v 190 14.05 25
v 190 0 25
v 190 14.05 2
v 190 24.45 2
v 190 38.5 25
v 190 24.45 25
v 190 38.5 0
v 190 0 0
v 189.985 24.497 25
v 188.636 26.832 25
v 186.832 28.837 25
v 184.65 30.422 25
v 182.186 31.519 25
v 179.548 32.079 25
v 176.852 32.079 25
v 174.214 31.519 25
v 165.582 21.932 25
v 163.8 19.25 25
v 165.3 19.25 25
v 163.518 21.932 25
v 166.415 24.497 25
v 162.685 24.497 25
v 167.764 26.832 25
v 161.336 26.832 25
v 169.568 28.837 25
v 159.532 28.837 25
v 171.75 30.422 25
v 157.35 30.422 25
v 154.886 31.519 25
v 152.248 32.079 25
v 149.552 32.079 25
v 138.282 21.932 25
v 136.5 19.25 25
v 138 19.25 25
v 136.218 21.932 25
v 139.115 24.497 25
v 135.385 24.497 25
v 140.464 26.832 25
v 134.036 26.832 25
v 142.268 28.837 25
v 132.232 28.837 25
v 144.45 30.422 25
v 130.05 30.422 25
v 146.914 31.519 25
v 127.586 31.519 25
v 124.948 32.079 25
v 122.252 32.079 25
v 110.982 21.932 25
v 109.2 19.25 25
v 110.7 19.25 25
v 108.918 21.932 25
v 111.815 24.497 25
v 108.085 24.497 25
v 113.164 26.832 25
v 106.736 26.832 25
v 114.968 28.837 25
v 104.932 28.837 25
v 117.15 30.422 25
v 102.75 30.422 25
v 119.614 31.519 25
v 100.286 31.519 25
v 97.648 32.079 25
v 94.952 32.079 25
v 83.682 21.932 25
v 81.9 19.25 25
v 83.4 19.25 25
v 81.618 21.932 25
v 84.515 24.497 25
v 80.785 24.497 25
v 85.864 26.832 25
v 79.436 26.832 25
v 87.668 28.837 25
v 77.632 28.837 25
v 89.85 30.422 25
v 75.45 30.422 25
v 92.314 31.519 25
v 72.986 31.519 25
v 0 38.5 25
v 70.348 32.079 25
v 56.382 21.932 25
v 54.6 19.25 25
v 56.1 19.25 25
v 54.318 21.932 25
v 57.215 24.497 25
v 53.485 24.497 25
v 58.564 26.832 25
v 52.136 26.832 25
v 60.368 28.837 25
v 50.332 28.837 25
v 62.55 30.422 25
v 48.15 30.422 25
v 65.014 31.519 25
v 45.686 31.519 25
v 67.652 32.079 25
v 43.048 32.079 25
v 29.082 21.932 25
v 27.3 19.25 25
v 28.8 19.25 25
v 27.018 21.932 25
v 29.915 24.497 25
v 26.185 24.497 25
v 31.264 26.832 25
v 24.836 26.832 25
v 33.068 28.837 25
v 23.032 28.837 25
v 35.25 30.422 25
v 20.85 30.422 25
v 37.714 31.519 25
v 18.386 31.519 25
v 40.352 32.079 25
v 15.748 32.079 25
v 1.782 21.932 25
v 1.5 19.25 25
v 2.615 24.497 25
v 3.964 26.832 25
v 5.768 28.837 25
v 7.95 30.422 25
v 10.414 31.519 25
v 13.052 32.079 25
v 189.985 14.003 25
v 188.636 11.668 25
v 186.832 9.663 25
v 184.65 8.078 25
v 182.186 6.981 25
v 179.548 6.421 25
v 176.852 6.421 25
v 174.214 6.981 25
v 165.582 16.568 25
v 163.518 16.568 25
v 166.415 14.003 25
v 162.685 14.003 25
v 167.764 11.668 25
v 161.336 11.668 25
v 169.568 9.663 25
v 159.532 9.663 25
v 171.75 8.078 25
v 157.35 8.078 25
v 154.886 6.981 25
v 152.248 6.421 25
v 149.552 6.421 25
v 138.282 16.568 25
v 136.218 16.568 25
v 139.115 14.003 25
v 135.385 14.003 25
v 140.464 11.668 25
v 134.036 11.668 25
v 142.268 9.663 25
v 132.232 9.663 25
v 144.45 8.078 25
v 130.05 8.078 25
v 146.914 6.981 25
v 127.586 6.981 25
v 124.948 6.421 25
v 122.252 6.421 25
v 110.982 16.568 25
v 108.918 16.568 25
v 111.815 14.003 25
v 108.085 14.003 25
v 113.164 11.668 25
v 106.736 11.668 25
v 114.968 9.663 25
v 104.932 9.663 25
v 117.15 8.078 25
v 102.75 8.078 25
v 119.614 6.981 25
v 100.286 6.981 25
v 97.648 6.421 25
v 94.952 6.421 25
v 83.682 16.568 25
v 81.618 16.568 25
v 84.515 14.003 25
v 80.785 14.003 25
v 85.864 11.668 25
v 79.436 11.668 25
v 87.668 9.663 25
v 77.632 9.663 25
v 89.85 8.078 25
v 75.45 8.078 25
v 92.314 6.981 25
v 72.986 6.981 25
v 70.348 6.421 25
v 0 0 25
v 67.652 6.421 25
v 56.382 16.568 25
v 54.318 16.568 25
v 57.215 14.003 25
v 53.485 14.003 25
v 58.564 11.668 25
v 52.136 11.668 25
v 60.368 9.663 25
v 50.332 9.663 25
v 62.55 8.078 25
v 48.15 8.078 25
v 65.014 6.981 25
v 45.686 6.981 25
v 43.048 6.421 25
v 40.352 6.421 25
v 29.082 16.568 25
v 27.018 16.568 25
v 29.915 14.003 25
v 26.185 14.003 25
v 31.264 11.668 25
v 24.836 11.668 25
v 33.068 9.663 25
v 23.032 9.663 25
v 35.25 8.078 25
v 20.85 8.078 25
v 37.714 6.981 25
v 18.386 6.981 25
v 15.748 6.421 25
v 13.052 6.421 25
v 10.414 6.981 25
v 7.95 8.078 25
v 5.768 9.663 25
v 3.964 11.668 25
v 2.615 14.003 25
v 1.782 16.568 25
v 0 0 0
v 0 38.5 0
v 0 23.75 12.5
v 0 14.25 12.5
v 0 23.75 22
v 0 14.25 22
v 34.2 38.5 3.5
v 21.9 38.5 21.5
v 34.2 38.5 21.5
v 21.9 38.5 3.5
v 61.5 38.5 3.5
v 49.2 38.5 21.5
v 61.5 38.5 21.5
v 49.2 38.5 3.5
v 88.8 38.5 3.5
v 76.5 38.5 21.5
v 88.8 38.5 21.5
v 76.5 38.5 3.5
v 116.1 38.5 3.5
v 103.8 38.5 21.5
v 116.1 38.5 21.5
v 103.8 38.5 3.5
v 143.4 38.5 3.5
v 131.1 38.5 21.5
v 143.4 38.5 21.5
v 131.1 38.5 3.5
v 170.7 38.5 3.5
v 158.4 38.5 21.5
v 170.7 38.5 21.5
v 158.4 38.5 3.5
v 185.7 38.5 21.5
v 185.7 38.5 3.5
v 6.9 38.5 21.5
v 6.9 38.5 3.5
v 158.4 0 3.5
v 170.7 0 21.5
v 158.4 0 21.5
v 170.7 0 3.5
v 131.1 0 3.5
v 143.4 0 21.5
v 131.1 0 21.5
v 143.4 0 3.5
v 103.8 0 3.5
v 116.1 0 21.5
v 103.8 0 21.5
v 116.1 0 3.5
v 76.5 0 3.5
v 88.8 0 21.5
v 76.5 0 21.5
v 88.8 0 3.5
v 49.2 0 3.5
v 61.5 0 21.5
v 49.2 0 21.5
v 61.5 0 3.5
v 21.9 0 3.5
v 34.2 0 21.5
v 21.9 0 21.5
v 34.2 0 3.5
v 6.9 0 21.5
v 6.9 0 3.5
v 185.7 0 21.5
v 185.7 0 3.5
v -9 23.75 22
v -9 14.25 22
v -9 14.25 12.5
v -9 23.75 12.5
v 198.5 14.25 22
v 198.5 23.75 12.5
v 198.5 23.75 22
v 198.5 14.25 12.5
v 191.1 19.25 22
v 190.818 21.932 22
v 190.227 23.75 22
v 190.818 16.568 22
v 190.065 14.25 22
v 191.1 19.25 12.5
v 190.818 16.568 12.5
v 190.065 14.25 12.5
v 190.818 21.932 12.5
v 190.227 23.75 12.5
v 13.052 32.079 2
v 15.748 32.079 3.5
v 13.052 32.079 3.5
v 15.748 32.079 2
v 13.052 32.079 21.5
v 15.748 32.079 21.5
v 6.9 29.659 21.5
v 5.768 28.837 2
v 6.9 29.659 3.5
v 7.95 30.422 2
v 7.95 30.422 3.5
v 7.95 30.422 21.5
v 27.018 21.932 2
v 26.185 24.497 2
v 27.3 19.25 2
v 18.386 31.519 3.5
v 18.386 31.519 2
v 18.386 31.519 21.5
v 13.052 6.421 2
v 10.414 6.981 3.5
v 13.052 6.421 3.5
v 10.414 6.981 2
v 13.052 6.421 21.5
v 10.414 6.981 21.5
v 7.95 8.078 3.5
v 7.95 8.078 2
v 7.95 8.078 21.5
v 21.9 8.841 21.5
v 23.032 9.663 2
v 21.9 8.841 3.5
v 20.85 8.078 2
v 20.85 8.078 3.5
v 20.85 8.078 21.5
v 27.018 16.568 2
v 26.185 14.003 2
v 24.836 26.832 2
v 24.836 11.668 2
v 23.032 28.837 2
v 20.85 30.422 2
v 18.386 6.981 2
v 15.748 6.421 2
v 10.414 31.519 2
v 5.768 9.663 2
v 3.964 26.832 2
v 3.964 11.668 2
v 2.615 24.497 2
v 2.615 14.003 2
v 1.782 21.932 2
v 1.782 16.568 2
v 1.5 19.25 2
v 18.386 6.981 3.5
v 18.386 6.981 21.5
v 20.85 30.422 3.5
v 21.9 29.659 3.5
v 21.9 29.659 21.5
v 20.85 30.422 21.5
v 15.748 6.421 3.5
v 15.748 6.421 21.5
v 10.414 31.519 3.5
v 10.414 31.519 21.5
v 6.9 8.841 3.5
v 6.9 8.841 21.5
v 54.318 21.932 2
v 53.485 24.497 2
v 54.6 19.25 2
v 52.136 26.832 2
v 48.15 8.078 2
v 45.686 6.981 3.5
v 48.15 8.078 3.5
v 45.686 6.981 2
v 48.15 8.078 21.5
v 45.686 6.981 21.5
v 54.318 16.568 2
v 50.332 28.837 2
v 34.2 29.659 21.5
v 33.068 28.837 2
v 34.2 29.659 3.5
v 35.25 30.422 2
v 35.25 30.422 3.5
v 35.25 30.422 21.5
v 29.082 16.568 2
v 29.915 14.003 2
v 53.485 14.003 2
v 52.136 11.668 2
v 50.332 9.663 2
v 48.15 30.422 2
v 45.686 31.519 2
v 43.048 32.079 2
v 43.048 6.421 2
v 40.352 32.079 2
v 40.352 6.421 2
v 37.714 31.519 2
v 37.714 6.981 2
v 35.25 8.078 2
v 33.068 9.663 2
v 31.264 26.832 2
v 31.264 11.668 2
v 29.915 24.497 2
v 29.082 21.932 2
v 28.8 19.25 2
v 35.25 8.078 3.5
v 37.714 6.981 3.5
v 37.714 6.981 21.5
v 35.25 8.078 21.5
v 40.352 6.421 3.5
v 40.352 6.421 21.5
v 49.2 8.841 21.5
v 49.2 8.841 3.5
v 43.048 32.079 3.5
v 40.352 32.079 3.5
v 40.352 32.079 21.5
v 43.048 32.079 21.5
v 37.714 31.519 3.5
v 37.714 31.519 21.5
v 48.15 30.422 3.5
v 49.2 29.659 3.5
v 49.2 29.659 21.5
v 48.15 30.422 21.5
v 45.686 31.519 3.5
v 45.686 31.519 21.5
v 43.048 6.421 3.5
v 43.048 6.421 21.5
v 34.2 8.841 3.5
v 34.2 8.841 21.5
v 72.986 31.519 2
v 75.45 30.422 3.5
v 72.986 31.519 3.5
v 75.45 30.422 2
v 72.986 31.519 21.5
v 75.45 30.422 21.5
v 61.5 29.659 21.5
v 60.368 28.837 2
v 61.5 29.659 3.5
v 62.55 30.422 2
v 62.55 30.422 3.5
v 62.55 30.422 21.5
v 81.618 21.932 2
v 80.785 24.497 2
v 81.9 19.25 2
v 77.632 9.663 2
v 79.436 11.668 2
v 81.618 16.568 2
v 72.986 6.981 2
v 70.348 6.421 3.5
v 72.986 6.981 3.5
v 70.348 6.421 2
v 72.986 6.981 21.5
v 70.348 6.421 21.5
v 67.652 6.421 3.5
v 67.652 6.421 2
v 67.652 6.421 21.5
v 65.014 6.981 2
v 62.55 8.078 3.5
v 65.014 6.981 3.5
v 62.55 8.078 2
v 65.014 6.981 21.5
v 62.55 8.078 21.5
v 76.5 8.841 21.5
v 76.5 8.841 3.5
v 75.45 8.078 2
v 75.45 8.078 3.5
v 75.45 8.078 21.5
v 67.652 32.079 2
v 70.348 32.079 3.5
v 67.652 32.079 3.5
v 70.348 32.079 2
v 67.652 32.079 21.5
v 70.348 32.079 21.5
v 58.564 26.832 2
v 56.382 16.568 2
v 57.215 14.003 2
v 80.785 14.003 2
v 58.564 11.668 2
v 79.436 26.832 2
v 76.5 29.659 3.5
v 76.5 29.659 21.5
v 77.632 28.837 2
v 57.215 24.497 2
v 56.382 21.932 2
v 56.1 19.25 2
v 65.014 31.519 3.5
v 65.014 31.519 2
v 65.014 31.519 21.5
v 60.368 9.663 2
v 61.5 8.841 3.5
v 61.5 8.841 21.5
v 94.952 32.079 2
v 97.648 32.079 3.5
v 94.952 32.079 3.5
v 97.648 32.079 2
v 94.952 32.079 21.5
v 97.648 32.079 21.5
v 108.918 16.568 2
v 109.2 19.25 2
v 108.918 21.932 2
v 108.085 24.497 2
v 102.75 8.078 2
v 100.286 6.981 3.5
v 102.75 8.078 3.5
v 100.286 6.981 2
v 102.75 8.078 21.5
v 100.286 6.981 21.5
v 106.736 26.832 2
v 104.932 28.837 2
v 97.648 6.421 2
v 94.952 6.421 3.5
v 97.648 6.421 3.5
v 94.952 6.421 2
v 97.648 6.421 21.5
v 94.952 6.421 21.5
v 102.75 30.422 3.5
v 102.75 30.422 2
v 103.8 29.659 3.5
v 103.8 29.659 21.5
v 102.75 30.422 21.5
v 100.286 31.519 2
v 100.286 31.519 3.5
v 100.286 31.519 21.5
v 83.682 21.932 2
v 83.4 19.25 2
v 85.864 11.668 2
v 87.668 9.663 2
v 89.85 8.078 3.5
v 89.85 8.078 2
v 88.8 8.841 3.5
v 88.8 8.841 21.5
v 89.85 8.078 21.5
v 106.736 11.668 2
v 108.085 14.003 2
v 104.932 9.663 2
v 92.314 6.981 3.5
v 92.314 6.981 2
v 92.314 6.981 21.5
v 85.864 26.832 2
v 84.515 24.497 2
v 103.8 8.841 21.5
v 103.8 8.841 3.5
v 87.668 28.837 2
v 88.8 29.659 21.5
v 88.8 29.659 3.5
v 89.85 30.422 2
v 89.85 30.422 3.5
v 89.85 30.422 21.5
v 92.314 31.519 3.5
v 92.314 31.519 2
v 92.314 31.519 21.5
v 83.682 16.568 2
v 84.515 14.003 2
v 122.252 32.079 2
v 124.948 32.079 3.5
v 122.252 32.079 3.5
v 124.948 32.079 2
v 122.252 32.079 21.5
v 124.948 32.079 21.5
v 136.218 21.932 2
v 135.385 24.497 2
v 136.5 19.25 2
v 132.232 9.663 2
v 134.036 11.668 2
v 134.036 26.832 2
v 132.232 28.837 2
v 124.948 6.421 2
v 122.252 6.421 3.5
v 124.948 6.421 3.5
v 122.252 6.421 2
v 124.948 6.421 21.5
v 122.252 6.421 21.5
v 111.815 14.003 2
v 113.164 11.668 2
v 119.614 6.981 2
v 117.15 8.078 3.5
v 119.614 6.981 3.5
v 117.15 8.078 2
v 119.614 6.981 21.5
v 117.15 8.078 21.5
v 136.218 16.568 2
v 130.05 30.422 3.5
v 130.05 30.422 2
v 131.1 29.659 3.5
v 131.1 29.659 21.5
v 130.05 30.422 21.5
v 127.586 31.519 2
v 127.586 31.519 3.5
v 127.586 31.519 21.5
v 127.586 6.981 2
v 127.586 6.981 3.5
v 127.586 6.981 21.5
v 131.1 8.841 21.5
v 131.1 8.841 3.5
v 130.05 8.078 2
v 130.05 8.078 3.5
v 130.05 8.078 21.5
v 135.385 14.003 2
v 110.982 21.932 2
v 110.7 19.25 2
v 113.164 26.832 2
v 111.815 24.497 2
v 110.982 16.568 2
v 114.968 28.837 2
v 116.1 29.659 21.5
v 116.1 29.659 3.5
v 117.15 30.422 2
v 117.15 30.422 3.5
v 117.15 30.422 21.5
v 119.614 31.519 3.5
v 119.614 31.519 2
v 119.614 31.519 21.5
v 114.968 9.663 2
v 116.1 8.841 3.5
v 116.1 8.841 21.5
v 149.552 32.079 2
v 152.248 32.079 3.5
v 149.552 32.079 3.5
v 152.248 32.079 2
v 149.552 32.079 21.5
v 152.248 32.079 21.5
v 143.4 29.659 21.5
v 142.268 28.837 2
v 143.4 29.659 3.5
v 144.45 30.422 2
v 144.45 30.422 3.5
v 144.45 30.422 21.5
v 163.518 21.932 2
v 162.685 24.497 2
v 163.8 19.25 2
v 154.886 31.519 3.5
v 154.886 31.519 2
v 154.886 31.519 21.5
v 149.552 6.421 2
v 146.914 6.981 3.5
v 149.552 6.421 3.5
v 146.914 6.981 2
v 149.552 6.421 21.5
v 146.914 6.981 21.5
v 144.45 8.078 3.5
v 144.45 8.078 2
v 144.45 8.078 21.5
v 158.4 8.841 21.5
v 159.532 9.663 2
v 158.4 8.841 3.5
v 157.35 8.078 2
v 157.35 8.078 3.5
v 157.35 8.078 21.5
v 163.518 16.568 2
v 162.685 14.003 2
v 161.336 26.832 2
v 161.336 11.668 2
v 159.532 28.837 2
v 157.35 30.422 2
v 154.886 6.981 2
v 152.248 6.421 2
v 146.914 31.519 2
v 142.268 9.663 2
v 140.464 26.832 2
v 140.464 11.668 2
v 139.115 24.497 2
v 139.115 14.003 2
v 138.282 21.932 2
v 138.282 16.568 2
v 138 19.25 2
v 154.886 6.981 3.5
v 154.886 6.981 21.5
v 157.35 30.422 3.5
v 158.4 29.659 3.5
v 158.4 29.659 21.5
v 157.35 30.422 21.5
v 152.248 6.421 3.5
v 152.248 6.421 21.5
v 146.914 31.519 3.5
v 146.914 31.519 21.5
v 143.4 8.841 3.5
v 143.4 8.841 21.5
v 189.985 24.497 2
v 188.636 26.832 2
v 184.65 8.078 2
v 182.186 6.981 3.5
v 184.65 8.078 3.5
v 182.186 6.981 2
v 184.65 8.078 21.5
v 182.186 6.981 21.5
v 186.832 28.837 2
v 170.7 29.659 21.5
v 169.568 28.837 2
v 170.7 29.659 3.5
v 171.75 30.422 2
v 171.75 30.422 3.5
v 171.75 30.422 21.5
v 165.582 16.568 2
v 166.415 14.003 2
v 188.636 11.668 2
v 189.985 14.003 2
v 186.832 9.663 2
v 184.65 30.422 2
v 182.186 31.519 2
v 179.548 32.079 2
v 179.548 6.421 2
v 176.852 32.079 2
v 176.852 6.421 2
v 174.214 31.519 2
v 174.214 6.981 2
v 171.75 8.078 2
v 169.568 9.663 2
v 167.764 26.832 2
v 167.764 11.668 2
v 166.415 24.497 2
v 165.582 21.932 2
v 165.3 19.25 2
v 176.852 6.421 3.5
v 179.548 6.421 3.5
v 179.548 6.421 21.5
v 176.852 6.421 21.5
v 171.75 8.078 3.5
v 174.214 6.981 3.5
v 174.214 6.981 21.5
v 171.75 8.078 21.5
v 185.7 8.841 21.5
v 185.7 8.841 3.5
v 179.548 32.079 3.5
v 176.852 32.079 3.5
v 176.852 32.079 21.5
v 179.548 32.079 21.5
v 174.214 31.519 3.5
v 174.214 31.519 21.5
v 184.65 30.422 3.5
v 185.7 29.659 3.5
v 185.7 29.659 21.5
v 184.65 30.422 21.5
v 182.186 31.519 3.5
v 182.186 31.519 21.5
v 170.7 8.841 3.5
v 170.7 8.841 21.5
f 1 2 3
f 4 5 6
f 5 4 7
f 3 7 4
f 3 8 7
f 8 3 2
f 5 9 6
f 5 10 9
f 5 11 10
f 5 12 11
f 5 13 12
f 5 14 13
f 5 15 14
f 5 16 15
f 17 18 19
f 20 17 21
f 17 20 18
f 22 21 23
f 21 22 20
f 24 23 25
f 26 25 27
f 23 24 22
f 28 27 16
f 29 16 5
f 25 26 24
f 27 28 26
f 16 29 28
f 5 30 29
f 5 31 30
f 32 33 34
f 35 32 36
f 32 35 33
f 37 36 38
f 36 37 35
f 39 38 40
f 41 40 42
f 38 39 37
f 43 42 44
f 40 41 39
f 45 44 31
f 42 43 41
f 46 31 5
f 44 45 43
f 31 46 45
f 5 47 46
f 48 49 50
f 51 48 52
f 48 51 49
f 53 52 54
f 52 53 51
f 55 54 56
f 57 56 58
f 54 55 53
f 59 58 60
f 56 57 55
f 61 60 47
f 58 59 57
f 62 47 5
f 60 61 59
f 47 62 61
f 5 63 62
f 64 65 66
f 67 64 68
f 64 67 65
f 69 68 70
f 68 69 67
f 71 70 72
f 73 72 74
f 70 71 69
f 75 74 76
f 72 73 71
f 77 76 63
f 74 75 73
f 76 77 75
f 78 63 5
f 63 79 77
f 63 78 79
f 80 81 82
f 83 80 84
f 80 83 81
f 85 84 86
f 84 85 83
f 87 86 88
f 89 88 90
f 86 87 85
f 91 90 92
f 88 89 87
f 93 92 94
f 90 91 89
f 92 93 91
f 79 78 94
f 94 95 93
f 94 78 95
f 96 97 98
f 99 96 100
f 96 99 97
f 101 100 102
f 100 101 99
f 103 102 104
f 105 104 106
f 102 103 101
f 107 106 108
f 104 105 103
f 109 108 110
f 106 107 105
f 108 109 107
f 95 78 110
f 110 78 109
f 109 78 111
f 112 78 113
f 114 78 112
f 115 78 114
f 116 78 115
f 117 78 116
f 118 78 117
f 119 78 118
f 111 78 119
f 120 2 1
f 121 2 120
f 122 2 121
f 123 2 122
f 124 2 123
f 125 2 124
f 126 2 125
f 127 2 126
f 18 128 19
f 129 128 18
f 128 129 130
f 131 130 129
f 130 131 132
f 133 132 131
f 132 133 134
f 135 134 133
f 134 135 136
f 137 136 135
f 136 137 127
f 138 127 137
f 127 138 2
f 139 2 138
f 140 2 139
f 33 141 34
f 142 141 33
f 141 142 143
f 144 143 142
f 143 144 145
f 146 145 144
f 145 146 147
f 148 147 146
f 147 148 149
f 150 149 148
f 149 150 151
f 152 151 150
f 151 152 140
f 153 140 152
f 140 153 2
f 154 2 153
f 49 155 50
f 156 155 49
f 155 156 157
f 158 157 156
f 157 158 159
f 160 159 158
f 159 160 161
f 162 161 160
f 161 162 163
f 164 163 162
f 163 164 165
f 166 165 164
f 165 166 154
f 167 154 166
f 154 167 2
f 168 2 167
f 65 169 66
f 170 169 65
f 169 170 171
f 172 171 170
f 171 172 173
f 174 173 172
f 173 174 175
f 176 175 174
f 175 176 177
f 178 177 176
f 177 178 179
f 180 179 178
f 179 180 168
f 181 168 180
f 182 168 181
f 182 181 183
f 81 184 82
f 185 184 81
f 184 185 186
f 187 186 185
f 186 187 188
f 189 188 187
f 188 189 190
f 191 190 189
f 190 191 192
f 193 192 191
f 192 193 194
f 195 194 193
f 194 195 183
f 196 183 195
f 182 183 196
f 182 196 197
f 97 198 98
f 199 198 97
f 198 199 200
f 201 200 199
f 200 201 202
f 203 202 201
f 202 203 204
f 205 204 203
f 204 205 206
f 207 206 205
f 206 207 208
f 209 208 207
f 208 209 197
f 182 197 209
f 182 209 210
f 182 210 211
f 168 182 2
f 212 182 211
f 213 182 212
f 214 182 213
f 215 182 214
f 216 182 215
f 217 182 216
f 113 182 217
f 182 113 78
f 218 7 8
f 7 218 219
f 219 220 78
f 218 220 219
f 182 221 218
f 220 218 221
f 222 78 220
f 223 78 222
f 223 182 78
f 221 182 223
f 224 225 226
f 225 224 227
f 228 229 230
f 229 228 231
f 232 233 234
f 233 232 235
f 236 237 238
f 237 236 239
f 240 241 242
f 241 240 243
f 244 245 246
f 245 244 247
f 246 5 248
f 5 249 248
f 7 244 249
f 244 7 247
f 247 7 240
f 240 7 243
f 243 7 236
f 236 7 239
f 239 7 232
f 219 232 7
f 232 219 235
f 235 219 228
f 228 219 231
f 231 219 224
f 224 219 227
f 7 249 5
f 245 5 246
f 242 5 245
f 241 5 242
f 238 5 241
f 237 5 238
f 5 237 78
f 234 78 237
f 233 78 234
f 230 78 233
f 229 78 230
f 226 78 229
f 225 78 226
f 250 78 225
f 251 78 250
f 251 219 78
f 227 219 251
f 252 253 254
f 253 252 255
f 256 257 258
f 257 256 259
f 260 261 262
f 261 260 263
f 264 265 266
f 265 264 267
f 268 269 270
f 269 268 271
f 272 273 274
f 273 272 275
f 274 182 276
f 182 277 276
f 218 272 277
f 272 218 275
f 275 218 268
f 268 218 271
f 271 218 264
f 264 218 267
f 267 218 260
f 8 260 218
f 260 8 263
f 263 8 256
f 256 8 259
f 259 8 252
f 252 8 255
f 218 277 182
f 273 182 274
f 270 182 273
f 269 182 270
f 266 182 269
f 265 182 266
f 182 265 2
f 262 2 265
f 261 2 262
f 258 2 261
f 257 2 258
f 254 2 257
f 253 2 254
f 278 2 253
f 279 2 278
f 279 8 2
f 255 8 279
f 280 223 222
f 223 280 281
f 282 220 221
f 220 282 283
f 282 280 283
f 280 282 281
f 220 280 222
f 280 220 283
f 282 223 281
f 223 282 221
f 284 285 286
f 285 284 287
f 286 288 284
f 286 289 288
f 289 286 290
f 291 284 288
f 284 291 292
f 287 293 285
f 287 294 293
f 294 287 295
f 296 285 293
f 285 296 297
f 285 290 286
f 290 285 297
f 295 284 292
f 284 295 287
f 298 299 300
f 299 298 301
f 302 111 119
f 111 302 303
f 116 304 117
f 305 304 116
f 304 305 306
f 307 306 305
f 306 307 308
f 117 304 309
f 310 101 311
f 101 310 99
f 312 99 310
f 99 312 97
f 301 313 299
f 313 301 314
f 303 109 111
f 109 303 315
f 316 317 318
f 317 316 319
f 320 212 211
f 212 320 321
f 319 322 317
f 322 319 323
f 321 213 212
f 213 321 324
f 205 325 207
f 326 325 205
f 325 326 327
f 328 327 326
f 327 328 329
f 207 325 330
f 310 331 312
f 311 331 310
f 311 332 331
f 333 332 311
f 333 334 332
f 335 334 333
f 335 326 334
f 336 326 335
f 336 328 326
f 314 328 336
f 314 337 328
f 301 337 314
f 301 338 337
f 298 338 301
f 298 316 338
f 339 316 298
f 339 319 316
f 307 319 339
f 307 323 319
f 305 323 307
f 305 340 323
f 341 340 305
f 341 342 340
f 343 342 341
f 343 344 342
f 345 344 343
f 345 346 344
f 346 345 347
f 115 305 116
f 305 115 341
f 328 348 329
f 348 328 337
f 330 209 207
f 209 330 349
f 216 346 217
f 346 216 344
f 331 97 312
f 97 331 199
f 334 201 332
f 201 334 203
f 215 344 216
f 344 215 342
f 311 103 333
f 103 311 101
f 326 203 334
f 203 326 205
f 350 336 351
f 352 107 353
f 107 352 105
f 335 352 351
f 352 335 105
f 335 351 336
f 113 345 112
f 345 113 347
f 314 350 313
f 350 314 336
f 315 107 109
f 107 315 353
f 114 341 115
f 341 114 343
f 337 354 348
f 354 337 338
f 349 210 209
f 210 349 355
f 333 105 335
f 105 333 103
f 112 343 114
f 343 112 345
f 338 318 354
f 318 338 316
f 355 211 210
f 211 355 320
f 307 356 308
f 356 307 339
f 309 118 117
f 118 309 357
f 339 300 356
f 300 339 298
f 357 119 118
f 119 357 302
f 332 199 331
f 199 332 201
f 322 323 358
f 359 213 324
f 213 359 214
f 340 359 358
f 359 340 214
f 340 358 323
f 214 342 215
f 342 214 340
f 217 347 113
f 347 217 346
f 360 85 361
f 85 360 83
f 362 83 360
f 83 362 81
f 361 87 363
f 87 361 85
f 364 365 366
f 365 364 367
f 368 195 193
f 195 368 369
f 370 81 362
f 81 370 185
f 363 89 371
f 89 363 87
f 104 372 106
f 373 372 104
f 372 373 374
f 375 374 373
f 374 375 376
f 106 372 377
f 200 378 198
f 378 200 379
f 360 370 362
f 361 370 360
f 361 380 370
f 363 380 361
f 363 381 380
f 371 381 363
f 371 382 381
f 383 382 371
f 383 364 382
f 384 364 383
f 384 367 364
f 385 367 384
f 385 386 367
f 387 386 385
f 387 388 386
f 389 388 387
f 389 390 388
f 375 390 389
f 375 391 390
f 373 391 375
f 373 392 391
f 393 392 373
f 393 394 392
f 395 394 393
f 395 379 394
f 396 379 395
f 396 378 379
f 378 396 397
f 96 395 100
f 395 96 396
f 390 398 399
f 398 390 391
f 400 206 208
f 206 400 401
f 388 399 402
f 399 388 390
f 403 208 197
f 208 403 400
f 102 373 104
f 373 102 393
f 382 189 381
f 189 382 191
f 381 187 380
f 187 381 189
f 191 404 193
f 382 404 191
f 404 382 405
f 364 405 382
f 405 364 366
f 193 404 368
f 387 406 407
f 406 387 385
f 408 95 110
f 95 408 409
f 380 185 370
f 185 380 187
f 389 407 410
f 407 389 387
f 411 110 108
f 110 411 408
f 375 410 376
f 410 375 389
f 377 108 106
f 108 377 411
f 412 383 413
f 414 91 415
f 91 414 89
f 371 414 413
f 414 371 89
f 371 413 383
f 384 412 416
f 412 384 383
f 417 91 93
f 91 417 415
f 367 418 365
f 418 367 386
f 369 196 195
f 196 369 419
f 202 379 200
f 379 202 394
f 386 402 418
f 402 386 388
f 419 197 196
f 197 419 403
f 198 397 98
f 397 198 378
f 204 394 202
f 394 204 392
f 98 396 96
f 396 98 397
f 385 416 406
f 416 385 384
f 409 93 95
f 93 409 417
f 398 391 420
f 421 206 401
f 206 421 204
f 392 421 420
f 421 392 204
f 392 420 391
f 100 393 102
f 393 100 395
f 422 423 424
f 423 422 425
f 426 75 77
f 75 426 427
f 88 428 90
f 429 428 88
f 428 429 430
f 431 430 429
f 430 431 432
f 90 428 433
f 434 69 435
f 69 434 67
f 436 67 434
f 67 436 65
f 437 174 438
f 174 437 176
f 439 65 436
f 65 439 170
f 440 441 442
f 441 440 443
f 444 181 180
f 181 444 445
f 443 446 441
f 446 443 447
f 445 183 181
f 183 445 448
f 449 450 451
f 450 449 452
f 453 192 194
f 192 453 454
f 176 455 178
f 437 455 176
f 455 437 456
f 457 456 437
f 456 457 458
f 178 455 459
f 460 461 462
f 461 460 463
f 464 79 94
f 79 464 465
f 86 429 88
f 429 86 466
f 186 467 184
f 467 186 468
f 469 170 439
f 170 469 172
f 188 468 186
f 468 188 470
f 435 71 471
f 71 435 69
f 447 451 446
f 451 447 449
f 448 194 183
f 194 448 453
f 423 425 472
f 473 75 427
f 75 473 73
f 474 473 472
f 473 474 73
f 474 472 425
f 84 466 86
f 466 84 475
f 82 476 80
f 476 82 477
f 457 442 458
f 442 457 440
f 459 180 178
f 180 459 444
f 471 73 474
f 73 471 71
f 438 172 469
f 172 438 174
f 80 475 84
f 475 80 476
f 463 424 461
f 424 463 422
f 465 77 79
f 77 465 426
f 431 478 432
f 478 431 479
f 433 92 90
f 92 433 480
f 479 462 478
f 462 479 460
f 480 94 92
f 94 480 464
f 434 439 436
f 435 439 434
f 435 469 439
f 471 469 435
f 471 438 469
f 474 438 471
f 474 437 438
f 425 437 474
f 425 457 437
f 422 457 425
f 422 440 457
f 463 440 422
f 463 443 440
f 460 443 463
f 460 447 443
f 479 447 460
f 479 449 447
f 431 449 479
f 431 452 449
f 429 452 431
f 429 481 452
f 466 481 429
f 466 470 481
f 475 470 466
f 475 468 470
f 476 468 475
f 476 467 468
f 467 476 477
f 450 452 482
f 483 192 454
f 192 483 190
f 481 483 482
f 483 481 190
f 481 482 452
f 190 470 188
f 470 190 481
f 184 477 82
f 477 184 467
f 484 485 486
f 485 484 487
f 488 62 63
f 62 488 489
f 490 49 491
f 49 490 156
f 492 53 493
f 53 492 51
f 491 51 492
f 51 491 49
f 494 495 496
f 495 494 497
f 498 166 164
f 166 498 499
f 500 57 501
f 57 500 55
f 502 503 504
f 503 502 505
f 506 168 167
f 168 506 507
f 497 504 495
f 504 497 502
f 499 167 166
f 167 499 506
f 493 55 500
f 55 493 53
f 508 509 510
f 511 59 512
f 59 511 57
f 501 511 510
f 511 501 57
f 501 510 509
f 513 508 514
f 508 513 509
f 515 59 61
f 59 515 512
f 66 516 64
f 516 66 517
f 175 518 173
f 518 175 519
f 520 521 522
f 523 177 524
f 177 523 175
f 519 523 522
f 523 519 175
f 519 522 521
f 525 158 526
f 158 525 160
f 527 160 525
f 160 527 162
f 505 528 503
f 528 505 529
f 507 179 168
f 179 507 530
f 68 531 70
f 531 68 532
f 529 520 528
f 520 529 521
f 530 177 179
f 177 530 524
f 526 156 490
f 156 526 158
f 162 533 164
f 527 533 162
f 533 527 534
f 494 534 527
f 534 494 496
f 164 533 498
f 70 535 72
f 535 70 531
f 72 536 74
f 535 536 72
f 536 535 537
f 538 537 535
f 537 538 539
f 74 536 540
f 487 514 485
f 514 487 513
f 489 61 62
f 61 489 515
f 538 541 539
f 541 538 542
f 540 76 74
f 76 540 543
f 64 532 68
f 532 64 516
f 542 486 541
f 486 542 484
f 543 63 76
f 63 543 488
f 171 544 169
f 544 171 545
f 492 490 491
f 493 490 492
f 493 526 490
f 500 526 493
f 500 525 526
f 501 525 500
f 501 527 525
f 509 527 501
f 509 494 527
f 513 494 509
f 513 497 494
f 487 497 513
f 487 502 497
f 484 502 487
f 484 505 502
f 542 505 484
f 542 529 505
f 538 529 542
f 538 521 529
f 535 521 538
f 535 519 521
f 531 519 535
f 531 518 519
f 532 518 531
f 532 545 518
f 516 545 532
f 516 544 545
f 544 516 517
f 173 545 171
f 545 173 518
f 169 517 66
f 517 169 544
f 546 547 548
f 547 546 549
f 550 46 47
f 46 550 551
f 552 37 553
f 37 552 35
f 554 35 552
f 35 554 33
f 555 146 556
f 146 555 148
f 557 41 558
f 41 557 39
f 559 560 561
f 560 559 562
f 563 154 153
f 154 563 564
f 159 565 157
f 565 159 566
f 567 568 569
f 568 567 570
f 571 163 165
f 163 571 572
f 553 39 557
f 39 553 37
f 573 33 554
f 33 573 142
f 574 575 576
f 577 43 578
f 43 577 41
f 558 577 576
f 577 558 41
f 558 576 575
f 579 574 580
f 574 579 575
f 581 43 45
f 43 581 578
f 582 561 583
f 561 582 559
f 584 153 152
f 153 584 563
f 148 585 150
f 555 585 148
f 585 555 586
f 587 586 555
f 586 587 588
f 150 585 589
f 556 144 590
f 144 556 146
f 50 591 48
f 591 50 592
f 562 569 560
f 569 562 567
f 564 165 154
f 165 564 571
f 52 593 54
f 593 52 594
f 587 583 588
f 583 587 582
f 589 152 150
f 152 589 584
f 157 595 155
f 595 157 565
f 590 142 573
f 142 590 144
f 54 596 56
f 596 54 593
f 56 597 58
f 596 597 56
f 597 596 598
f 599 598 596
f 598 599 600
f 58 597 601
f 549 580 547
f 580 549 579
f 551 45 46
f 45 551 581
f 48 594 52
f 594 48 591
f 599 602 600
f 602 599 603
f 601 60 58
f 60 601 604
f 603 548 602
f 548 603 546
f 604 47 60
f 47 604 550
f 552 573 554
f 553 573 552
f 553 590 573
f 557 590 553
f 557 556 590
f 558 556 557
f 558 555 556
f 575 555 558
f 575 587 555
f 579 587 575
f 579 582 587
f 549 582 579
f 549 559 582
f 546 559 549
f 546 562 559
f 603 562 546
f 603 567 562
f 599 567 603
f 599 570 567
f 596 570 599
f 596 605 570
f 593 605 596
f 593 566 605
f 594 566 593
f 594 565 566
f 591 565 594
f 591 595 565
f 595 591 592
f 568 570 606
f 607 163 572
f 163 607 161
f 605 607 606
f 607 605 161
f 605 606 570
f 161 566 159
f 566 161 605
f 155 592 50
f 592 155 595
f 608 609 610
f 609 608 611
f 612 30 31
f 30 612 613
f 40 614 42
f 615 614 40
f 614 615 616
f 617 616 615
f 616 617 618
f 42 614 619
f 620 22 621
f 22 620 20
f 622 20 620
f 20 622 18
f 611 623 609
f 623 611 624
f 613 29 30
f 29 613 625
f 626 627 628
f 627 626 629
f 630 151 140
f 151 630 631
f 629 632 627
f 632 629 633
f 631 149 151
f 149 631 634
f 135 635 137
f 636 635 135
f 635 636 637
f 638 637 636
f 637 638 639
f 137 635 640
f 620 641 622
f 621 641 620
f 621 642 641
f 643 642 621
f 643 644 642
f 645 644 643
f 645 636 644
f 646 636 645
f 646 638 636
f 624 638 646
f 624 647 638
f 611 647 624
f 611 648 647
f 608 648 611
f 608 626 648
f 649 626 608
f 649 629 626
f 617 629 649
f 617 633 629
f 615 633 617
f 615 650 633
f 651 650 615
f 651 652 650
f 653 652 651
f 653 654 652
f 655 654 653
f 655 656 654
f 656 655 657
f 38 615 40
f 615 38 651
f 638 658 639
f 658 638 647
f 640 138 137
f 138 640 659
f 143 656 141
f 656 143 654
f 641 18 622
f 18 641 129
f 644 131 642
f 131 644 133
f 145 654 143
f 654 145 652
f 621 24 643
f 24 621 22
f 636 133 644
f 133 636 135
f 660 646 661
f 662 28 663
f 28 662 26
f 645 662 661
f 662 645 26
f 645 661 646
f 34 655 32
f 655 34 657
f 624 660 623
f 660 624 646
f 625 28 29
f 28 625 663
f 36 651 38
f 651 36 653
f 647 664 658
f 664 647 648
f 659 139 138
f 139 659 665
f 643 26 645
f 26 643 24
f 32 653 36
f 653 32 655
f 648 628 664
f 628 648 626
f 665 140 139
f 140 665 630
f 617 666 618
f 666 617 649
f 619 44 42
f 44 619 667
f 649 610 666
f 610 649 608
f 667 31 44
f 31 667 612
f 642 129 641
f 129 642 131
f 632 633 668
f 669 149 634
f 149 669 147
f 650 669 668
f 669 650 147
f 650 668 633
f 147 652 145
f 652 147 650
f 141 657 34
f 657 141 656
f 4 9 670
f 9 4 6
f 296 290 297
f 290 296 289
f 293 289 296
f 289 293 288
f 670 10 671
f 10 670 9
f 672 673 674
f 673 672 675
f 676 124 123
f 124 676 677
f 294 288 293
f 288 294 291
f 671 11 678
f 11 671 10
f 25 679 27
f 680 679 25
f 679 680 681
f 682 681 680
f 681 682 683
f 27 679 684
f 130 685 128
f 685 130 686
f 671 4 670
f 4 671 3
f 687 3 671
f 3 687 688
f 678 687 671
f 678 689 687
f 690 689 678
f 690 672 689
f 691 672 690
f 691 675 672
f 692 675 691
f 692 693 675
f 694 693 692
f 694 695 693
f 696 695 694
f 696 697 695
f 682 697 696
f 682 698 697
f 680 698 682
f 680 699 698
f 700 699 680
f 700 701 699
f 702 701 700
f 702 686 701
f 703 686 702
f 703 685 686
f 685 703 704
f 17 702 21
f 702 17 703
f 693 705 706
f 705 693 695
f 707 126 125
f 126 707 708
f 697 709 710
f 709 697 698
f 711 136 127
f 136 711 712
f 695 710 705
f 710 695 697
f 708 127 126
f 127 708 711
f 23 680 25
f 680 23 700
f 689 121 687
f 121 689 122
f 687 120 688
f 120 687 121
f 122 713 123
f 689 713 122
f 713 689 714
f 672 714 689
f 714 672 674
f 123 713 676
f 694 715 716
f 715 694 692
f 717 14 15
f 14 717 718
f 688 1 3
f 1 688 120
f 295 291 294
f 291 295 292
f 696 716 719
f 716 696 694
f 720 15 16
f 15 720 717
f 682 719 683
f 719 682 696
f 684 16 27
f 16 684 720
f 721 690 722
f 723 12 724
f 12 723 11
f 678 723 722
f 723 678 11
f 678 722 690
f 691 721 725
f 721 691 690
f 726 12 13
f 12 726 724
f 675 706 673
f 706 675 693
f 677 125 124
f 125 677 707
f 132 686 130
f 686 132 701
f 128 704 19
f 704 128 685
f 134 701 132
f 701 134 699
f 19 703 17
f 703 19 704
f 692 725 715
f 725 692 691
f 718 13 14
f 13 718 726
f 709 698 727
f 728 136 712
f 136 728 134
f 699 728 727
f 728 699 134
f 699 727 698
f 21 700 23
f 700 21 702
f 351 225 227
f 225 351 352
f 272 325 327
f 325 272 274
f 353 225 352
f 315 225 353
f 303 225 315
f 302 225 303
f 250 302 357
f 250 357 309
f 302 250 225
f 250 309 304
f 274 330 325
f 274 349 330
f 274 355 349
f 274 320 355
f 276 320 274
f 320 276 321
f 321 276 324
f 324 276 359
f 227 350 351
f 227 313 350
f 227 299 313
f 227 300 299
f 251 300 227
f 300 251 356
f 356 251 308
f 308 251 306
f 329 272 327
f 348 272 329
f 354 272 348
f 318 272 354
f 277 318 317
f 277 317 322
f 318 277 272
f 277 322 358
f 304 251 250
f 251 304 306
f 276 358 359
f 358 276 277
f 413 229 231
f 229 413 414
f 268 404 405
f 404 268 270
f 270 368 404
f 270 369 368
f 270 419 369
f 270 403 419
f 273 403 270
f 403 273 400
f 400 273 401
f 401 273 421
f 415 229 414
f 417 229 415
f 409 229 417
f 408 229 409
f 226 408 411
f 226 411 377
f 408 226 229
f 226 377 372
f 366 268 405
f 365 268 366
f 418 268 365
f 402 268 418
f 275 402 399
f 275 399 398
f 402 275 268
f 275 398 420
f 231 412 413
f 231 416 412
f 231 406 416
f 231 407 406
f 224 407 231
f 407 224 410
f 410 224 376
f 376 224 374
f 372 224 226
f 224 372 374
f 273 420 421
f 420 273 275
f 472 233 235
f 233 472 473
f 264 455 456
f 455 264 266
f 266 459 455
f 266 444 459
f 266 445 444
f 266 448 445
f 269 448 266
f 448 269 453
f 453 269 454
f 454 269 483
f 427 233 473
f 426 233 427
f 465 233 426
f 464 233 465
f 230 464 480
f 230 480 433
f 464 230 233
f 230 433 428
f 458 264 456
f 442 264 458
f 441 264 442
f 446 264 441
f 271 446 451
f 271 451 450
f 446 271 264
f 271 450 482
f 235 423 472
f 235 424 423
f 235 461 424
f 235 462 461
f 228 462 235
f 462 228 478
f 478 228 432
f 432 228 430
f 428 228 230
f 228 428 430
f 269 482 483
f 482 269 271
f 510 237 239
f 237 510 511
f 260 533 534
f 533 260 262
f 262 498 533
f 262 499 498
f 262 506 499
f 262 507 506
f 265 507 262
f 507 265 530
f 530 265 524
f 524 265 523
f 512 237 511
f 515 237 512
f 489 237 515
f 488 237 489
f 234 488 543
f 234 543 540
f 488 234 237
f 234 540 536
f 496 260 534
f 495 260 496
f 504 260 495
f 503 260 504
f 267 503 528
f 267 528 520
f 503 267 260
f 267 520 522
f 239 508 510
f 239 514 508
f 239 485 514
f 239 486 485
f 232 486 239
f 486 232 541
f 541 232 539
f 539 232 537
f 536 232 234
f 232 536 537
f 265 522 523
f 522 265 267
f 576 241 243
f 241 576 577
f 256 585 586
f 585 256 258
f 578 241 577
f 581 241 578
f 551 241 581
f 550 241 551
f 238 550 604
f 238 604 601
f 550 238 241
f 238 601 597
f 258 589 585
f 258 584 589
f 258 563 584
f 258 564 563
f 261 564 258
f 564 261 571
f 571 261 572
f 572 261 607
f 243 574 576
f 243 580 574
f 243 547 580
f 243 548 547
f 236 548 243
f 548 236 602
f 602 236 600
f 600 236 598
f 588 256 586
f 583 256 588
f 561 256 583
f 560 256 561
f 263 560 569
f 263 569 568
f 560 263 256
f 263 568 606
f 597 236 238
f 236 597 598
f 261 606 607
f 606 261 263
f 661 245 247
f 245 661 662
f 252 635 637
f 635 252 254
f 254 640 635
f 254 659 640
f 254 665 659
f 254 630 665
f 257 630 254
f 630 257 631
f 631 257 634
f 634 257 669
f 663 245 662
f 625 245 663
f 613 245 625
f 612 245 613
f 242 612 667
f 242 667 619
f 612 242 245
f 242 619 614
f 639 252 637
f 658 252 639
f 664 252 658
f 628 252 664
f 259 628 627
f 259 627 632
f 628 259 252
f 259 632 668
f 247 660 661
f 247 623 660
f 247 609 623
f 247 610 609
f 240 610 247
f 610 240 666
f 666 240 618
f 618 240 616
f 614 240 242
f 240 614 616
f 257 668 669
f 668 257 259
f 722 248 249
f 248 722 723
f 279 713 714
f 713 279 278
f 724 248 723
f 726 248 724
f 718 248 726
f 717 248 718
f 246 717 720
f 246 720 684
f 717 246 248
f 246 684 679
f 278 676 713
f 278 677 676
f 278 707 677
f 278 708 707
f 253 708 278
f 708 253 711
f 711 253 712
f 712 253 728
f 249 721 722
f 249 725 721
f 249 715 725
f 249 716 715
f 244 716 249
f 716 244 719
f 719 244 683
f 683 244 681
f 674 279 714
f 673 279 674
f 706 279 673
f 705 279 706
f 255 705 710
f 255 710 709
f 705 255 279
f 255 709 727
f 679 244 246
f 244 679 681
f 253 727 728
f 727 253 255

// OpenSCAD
// file: sizes.scad
citadel_pot=33.5;
citadel_radius=citadel_pot/2;
citadel_height=44;

vallejo_pot=25.8;
vallejo_radius=vallejo_pot/2;
vallejo_height=77.5;

tray_length=190;
tray_depth=citadel_pot+5;
tray_height=25;

hole_size=10;
// main file
include <sizes.scad>;
margin_y=(tray_depth - citadel_pot) /2;
margin_x=(tray_length - 5*citadel_pot)/15;

difference() {
    union() {
        // base 
        cube([tray_length, tray_depth, tray_height]);
        // connectors
        translate([-9, tray_depth/2-5, tray_height/2])cube([hole_size-0.5,hole_size-0.5,hole_size-0.5]);
        translate([tray_length-1, tray_depth/2-5, tray_height/2])cube([hole_size-0.5,hole_size-0.5,hole_size-0.5]);
    };
    
    // bottle holes
    for(x=[0:6])
        translate([margin_x + vallejo_radius + x*margin_x + x*vallejo_pot, citadel_radius + margin_y, 2])
            cylinder(r=vallejo_radius, h=vallejo_height);
    
    // holes to reduce material consumption
    for(x=[0:6])
        // @TODO remove magic numbers
        translate([-6+vallejo_radius + x*margin_x + x*vallejo_pot, citadel_radius + margin_y-50, 3.5])
            cube([15,100,18]);
};
